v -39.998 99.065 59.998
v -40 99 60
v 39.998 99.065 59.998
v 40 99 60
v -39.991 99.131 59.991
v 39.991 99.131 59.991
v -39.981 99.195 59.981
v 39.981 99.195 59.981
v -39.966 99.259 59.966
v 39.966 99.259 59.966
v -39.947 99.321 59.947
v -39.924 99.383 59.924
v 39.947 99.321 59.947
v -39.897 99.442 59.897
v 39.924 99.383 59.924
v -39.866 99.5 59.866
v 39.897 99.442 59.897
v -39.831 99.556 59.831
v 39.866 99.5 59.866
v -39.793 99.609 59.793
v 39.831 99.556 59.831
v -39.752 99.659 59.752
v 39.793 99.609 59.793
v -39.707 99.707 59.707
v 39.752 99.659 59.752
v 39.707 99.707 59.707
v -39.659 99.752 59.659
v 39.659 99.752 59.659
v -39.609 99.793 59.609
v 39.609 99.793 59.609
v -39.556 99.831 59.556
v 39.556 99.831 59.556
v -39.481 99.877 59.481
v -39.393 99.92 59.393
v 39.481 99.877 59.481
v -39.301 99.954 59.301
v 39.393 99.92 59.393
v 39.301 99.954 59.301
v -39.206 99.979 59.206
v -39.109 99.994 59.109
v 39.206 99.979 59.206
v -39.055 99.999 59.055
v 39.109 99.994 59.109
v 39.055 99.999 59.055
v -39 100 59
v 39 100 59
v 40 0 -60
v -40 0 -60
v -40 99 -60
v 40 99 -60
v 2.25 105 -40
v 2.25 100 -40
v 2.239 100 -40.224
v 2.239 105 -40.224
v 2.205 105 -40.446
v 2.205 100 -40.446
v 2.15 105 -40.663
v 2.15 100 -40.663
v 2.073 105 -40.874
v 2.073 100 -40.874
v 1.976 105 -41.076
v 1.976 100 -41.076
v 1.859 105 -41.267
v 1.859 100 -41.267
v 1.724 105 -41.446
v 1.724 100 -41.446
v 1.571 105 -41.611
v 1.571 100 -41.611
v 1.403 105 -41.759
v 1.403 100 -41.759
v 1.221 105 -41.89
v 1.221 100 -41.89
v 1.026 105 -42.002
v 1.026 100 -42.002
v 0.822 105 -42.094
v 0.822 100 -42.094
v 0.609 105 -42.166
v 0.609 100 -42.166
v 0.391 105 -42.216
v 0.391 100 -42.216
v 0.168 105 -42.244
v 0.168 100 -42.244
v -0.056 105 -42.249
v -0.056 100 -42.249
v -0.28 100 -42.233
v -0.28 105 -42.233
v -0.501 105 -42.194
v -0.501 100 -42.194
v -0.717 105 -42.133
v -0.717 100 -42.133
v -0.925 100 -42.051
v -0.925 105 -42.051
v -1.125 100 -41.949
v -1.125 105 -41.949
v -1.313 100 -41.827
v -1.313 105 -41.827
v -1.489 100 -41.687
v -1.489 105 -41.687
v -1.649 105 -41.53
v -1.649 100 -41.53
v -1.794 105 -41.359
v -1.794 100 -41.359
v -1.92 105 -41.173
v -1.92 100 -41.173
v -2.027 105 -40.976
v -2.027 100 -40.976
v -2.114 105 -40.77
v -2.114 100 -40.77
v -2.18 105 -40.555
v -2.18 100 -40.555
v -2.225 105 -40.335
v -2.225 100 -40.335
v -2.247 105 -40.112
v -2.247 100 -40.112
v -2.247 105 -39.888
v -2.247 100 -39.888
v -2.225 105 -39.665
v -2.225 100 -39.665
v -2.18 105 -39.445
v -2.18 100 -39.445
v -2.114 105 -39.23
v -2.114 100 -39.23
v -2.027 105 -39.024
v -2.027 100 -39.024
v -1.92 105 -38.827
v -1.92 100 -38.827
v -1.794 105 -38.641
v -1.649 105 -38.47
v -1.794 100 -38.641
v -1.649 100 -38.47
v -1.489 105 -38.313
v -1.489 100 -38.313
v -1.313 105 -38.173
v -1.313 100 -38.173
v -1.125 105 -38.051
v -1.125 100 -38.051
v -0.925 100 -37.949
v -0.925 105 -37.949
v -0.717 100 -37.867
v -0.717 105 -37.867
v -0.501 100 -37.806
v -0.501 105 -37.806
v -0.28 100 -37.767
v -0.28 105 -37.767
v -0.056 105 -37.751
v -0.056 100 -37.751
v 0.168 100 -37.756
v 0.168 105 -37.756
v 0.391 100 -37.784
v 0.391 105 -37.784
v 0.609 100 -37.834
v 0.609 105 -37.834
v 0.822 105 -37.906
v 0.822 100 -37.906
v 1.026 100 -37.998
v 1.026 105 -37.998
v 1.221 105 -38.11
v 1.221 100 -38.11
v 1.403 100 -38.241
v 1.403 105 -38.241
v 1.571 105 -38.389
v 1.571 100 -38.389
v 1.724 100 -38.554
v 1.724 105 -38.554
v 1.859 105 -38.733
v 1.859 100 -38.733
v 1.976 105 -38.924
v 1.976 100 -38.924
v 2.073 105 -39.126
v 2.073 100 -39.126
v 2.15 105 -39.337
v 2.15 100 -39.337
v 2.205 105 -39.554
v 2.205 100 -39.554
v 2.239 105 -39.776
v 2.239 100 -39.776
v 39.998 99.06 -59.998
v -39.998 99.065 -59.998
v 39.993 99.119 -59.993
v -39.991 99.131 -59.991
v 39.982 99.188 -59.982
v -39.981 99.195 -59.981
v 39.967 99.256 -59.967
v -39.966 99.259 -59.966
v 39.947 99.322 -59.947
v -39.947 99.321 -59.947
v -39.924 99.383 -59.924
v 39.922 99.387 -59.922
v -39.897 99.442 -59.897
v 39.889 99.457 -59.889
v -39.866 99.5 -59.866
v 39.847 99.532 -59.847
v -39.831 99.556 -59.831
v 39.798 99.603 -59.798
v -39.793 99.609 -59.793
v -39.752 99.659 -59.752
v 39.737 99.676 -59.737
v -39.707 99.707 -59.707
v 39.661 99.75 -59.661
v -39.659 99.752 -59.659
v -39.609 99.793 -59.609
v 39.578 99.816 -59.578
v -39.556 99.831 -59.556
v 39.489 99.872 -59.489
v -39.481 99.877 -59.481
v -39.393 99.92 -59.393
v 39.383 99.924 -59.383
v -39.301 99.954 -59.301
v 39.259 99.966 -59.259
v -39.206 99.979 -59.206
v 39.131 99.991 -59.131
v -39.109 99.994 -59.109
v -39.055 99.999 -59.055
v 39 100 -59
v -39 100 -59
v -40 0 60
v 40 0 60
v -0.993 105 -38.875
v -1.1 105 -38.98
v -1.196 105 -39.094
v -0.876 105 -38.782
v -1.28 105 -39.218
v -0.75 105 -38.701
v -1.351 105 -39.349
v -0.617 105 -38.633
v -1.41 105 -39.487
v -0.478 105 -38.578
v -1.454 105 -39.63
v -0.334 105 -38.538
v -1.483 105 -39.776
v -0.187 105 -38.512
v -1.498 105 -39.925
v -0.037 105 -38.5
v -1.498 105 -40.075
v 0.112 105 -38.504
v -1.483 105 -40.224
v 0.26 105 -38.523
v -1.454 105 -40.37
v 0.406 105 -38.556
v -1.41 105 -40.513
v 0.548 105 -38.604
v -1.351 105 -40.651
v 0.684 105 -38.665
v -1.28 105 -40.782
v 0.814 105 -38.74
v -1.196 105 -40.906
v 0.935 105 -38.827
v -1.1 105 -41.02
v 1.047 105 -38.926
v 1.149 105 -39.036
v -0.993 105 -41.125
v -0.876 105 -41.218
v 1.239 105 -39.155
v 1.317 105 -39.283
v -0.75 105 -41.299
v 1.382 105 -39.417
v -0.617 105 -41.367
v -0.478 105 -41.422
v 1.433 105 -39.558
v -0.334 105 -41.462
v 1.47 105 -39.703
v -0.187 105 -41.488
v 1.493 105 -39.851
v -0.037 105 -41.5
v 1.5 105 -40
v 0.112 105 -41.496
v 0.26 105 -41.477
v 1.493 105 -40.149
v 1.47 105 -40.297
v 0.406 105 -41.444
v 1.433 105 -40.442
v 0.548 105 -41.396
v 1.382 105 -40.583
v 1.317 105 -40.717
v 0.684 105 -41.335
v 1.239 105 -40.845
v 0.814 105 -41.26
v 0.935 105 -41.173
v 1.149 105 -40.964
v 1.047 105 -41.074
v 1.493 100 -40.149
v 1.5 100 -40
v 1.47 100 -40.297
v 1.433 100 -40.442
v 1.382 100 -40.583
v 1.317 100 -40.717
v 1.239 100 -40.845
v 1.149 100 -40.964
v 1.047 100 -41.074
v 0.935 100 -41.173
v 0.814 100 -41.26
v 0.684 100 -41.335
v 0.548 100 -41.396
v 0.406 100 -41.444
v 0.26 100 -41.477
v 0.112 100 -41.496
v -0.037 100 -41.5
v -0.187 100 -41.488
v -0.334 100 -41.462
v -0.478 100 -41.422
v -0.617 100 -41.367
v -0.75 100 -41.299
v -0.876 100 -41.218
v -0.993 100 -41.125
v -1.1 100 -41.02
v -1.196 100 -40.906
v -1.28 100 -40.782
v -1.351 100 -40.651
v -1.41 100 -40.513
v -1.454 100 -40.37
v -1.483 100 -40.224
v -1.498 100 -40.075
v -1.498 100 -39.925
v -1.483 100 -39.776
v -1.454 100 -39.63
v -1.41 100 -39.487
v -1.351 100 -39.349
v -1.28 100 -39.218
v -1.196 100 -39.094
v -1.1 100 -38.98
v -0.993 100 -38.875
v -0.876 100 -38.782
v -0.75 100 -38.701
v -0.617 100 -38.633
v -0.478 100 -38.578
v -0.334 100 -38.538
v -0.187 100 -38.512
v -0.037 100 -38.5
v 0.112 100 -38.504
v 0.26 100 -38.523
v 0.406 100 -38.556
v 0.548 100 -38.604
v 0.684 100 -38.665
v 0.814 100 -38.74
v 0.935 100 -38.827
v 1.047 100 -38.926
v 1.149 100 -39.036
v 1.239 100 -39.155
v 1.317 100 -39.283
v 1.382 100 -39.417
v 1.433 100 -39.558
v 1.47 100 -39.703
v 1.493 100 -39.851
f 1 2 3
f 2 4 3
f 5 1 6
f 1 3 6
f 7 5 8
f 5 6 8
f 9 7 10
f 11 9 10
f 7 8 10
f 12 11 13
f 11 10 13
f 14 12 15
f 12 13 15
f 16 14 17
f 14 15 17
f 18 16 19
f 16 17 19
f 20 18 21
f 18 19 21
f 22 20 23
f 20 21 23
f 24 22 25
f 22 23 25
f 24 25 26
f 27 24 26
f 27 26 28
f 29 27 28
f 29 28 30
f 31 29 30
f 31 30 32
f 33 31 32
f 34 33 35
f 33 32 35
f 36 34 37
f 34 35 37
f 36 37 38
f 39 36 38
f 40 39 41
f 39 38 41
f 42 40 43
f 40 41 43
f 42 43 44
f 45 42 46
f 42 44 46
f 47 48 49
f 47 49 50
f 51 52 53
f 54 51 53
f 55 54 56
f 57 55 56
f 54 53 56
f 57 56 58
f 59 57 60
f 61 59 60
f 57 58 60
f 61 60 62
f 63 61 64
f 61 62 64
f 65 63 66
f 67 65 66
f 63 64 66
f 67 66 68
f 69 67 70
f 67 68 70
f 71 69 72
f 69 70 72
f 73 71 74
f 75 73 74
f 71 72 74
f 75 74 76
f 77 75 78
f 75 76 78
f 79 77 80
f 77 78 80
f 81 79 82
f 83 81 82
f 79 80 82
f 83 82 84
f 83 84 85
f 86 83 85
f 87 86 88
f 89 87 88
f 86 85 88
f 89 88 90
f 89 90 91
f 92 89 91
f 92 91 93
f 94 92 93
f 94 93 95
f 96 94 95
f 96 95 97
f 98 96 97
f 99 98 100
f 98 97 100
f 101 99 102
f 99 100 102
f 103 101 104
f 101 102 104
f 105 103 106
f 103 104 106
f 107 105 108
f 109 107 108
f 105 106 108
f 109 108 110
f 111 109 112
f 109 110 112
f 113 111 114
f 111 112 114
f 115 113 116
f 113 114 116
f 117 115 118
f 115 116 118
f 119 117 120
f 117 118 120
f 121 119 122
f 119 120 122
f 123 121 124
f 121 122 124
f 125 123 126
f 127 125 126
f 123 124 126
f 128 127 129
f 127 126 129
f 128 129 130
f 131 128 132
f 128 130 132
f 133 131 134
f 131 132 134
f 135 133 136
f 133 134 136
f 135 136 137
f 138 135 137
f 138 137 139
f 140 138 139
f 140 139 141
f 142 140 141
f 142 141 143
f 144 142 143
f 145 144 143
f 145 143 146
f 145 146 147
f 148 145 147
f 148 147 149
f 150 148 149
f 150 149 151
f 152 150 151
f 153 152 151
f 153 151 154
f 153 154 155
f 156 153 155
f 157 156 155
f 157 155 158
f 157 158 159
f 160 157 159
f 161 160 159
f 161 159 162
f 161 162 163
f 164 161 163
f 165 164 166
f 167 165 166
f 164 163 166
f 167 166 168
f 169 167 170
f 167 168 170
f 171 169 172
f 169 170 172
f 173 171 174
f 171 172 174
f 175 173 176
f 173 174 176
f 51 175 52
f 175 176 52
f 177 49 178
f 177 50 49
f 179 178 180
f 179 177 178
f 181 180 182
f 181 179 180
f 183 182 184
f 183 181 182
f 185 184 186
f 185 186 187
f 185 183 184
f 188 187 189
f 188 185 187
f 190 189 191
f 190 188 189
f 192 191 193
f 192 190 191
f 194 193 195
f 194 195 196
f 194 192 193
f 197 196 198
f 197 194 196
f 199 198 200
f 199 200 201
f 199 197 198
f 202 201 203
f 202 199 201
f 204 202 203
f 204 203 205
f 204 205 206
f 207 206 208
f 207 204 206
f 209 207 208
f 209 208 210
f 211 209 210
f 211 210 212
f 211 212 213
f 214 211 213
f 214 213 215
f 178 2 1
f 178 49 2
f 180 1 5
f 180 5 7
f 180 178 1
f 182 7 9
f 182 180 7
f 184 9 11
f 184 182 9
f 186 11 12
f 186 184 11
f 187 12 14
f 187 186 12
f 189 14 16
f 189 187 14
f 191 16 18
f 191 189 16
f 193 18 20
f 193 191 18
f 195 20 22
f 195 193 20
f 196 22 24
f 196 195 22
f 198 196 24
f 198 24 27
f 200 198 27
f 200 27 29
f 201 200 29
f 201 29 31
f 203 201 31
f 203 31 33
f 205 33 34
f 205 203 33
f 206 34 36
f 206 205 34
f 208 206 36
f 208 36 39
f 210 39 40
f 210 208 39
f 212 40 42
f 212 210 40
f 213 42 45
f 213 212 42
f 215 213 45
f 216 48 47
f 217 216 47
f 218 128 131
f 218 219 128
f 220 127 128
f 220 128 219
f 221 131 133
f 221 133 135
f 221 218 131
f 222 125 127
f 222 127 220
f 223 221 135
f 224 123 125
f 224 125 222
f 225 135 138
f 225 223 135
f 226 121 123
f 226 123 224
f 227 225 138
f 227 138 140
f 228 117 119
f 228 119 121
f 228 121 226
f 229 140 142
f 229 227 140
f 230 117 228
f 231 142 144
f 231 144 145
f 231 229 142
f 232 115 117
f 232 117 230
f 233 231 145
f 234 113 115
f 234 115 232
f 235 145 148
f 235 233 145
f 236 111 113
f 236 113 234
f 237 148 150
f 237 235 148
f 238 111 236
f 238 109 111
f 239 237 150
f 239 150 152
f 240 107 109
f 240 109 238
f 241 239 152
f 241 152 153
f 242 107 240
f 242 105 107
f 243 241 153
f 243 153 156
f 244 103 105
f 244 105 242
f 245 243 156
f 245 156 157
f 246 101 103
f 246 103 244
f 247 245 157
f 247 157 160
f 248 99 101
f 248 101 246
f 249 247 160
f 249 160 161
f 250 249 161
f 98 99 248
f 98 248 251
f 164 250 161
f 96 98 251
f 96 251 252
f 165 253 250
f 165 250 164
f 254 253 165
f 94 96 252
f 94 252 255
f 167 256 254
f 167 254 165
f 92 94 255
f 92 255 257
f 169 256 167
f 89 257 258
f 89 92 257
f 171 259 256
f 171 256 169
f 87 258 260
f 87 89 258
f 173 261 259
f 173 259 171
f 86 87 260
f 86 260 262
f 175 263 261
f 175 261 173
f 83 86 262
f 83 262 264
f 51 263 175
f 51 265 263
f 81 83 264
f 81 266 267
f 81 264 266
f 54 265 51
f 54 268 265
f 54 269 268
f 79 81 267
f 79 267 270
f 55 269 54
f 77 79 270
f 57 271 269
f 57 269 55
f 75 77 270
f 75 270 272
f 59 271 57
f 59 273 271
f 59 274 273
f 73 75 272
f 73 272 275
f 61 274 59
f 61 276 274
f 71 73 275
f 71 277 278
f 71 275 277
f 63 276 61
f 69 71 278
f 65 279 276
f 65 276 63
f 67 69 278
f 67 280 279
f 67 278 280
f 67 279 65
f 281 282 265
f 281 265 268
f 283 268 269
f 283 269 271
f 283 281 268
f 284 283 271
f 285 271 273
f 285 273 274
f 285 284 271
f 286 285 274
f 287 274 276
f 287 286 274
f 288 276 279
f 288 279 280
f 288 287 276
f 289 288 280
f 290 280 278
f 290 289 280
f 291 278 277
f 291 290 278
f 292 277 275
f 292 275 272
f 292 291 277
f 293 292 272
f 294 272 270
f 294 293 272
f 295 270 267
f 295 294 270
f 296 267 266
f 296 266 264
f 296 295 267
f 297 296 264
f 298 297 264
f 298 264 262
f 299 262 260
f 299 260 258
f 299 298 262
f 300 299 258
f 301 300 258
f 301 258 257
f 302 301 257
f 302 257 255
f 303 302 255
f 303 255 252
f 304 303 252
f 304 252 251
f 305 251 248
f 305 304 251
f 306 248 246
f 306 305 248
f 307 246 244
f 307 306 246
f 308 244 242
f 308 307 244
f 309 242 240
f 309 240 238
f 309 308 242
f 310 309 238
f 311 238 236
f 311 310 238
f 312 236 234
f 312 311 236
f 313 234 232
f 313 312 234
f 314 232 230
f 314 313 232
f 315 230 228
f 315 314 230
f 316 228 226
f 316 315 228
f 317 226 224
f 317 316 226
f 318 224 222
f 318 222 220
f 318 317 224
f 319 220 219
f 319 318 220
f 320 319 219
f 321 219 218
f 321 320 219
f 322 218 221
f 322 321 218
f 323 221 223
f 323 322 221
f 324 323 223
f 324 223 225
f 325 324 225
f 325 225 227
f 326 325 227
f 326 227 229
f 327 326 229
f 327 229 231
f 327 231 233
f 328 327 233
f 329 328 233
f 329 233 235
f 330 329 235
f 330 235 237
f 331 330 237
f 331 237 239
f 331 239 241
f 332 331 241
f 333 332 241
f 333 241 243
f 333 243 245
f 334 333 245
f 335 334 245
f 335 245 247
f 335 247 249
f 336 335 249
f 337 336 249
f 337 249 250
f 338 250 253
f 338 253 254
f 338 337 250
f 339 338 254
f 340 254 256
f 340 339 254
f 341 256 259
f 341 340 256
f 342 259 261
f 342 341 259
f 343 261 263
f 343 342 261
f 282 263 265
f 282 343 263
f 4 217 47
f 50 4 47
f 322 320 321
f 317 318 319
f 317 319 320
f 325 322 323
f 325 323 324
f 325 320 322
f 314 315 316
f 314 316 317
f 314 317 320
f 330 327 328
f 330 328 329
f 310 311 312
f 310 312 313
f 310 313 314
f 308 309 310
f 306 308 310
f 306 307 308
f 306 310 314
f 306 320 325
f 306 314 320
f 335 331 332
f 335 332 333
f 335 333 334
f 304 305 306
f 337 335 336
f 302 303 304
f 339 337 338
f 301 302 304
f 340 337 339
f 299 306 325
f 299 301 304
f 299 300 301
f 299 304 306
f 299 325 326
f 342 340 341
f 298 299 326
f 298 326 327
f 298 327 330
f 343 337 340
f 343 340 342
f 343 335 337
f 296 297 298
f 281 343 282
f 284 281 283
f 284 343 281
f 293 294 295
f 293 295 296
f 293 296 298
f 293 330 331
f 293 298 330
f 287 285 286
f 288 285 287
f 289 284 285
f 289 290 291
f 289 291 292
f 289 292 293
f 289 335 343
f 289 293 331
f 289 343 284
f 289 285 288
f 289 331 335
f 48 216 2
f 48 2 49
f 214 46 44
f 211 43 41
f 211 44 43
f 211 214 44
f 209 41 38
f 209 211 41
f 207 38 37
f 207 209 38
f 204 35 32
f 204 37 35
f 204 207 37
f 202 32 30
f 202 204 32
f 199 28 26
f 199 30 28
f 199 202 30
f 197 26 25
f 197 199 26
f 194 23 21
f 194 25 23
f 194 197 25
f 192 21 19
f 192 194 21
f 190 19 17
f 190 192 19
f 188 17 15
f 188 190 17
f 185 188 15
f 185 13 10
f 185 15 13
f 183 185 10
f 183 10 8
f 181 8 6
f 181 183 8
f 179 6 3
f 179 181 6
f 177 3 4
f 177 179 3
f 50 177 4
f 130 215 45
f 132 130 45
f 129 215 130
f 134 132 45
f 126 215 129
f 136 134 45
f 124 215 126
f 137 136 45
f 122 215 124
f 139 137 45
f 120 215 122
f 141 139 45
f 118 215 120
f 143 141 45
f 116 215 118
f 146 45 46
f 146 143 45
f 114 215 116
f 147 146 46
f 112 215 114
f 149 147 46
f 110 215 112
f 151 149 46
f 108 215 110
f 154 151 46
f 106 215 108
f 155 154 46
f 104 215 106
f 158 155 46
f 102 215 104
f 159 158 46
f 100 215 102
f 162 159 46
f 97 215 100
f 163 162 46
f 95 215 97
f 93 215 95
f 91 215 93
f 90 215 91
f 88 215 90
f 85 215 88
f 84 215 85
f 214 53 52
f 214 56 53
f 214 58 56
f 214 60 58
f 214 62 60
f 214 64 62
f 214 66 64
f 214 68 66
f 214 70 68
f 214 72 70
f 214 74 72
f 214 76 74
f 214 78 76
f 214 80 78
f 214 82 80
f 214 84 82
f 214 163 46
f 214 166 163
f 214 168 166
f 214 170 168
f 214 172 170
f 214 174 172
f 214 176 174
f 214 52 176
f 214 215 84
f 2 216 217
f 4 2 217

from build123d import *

# Parameters (mm, degrees)
SKETCH1_W           = 80
SKETCH1_H           = 120
BOSS_EXTRUDE1_DEPTH = 100
SKETCH2_R           = 2.25
SKETCH2_R_2         = 1.5
BOSS_EXTRUDE2_DEPTH = 5
FILLET1_R           = 1


with BuildPart() as part:
    # Sketch1 → Boss-Extrude1 (new body)
    with BuildSketch(Plane(origin=(0, 0, 0), x_dir=(1, 0, 0), z_dir=(0, 1, 0))):
        Rectangle(SKETCH1_W, SKETCH1_H)
    extrude(amount=BOSS_EXTRUDE1_DEPTH)

    # Sketch2 → Boss-Extrude2 (add)
    with BuildSketch(Plane(origin=(0, 100, 0), x_dir=(1, 0, 0), z_dir=(0, 1, 0))):
        with Locations((0, 40)):
            Circle(SKETCH2_R)
        with Locations((0, 40)):
            Circle(SKETCH2_R_2, mode=Mode.SUBTRACT)
    extrude(amount=BOSS_EXTRUDE2_DEPTH)

    # Fillet1
    fillet1_edges = [part.edges().sort_by_distance(p)[0] for p in [
        (-40, 100, 0),
        (0, 100, 60),
        (40, 100, 0),
        (0, 100, -60),
    ]]
    fillet(fillet1_edges, radius=FILLET1_R)


solid = part.part
